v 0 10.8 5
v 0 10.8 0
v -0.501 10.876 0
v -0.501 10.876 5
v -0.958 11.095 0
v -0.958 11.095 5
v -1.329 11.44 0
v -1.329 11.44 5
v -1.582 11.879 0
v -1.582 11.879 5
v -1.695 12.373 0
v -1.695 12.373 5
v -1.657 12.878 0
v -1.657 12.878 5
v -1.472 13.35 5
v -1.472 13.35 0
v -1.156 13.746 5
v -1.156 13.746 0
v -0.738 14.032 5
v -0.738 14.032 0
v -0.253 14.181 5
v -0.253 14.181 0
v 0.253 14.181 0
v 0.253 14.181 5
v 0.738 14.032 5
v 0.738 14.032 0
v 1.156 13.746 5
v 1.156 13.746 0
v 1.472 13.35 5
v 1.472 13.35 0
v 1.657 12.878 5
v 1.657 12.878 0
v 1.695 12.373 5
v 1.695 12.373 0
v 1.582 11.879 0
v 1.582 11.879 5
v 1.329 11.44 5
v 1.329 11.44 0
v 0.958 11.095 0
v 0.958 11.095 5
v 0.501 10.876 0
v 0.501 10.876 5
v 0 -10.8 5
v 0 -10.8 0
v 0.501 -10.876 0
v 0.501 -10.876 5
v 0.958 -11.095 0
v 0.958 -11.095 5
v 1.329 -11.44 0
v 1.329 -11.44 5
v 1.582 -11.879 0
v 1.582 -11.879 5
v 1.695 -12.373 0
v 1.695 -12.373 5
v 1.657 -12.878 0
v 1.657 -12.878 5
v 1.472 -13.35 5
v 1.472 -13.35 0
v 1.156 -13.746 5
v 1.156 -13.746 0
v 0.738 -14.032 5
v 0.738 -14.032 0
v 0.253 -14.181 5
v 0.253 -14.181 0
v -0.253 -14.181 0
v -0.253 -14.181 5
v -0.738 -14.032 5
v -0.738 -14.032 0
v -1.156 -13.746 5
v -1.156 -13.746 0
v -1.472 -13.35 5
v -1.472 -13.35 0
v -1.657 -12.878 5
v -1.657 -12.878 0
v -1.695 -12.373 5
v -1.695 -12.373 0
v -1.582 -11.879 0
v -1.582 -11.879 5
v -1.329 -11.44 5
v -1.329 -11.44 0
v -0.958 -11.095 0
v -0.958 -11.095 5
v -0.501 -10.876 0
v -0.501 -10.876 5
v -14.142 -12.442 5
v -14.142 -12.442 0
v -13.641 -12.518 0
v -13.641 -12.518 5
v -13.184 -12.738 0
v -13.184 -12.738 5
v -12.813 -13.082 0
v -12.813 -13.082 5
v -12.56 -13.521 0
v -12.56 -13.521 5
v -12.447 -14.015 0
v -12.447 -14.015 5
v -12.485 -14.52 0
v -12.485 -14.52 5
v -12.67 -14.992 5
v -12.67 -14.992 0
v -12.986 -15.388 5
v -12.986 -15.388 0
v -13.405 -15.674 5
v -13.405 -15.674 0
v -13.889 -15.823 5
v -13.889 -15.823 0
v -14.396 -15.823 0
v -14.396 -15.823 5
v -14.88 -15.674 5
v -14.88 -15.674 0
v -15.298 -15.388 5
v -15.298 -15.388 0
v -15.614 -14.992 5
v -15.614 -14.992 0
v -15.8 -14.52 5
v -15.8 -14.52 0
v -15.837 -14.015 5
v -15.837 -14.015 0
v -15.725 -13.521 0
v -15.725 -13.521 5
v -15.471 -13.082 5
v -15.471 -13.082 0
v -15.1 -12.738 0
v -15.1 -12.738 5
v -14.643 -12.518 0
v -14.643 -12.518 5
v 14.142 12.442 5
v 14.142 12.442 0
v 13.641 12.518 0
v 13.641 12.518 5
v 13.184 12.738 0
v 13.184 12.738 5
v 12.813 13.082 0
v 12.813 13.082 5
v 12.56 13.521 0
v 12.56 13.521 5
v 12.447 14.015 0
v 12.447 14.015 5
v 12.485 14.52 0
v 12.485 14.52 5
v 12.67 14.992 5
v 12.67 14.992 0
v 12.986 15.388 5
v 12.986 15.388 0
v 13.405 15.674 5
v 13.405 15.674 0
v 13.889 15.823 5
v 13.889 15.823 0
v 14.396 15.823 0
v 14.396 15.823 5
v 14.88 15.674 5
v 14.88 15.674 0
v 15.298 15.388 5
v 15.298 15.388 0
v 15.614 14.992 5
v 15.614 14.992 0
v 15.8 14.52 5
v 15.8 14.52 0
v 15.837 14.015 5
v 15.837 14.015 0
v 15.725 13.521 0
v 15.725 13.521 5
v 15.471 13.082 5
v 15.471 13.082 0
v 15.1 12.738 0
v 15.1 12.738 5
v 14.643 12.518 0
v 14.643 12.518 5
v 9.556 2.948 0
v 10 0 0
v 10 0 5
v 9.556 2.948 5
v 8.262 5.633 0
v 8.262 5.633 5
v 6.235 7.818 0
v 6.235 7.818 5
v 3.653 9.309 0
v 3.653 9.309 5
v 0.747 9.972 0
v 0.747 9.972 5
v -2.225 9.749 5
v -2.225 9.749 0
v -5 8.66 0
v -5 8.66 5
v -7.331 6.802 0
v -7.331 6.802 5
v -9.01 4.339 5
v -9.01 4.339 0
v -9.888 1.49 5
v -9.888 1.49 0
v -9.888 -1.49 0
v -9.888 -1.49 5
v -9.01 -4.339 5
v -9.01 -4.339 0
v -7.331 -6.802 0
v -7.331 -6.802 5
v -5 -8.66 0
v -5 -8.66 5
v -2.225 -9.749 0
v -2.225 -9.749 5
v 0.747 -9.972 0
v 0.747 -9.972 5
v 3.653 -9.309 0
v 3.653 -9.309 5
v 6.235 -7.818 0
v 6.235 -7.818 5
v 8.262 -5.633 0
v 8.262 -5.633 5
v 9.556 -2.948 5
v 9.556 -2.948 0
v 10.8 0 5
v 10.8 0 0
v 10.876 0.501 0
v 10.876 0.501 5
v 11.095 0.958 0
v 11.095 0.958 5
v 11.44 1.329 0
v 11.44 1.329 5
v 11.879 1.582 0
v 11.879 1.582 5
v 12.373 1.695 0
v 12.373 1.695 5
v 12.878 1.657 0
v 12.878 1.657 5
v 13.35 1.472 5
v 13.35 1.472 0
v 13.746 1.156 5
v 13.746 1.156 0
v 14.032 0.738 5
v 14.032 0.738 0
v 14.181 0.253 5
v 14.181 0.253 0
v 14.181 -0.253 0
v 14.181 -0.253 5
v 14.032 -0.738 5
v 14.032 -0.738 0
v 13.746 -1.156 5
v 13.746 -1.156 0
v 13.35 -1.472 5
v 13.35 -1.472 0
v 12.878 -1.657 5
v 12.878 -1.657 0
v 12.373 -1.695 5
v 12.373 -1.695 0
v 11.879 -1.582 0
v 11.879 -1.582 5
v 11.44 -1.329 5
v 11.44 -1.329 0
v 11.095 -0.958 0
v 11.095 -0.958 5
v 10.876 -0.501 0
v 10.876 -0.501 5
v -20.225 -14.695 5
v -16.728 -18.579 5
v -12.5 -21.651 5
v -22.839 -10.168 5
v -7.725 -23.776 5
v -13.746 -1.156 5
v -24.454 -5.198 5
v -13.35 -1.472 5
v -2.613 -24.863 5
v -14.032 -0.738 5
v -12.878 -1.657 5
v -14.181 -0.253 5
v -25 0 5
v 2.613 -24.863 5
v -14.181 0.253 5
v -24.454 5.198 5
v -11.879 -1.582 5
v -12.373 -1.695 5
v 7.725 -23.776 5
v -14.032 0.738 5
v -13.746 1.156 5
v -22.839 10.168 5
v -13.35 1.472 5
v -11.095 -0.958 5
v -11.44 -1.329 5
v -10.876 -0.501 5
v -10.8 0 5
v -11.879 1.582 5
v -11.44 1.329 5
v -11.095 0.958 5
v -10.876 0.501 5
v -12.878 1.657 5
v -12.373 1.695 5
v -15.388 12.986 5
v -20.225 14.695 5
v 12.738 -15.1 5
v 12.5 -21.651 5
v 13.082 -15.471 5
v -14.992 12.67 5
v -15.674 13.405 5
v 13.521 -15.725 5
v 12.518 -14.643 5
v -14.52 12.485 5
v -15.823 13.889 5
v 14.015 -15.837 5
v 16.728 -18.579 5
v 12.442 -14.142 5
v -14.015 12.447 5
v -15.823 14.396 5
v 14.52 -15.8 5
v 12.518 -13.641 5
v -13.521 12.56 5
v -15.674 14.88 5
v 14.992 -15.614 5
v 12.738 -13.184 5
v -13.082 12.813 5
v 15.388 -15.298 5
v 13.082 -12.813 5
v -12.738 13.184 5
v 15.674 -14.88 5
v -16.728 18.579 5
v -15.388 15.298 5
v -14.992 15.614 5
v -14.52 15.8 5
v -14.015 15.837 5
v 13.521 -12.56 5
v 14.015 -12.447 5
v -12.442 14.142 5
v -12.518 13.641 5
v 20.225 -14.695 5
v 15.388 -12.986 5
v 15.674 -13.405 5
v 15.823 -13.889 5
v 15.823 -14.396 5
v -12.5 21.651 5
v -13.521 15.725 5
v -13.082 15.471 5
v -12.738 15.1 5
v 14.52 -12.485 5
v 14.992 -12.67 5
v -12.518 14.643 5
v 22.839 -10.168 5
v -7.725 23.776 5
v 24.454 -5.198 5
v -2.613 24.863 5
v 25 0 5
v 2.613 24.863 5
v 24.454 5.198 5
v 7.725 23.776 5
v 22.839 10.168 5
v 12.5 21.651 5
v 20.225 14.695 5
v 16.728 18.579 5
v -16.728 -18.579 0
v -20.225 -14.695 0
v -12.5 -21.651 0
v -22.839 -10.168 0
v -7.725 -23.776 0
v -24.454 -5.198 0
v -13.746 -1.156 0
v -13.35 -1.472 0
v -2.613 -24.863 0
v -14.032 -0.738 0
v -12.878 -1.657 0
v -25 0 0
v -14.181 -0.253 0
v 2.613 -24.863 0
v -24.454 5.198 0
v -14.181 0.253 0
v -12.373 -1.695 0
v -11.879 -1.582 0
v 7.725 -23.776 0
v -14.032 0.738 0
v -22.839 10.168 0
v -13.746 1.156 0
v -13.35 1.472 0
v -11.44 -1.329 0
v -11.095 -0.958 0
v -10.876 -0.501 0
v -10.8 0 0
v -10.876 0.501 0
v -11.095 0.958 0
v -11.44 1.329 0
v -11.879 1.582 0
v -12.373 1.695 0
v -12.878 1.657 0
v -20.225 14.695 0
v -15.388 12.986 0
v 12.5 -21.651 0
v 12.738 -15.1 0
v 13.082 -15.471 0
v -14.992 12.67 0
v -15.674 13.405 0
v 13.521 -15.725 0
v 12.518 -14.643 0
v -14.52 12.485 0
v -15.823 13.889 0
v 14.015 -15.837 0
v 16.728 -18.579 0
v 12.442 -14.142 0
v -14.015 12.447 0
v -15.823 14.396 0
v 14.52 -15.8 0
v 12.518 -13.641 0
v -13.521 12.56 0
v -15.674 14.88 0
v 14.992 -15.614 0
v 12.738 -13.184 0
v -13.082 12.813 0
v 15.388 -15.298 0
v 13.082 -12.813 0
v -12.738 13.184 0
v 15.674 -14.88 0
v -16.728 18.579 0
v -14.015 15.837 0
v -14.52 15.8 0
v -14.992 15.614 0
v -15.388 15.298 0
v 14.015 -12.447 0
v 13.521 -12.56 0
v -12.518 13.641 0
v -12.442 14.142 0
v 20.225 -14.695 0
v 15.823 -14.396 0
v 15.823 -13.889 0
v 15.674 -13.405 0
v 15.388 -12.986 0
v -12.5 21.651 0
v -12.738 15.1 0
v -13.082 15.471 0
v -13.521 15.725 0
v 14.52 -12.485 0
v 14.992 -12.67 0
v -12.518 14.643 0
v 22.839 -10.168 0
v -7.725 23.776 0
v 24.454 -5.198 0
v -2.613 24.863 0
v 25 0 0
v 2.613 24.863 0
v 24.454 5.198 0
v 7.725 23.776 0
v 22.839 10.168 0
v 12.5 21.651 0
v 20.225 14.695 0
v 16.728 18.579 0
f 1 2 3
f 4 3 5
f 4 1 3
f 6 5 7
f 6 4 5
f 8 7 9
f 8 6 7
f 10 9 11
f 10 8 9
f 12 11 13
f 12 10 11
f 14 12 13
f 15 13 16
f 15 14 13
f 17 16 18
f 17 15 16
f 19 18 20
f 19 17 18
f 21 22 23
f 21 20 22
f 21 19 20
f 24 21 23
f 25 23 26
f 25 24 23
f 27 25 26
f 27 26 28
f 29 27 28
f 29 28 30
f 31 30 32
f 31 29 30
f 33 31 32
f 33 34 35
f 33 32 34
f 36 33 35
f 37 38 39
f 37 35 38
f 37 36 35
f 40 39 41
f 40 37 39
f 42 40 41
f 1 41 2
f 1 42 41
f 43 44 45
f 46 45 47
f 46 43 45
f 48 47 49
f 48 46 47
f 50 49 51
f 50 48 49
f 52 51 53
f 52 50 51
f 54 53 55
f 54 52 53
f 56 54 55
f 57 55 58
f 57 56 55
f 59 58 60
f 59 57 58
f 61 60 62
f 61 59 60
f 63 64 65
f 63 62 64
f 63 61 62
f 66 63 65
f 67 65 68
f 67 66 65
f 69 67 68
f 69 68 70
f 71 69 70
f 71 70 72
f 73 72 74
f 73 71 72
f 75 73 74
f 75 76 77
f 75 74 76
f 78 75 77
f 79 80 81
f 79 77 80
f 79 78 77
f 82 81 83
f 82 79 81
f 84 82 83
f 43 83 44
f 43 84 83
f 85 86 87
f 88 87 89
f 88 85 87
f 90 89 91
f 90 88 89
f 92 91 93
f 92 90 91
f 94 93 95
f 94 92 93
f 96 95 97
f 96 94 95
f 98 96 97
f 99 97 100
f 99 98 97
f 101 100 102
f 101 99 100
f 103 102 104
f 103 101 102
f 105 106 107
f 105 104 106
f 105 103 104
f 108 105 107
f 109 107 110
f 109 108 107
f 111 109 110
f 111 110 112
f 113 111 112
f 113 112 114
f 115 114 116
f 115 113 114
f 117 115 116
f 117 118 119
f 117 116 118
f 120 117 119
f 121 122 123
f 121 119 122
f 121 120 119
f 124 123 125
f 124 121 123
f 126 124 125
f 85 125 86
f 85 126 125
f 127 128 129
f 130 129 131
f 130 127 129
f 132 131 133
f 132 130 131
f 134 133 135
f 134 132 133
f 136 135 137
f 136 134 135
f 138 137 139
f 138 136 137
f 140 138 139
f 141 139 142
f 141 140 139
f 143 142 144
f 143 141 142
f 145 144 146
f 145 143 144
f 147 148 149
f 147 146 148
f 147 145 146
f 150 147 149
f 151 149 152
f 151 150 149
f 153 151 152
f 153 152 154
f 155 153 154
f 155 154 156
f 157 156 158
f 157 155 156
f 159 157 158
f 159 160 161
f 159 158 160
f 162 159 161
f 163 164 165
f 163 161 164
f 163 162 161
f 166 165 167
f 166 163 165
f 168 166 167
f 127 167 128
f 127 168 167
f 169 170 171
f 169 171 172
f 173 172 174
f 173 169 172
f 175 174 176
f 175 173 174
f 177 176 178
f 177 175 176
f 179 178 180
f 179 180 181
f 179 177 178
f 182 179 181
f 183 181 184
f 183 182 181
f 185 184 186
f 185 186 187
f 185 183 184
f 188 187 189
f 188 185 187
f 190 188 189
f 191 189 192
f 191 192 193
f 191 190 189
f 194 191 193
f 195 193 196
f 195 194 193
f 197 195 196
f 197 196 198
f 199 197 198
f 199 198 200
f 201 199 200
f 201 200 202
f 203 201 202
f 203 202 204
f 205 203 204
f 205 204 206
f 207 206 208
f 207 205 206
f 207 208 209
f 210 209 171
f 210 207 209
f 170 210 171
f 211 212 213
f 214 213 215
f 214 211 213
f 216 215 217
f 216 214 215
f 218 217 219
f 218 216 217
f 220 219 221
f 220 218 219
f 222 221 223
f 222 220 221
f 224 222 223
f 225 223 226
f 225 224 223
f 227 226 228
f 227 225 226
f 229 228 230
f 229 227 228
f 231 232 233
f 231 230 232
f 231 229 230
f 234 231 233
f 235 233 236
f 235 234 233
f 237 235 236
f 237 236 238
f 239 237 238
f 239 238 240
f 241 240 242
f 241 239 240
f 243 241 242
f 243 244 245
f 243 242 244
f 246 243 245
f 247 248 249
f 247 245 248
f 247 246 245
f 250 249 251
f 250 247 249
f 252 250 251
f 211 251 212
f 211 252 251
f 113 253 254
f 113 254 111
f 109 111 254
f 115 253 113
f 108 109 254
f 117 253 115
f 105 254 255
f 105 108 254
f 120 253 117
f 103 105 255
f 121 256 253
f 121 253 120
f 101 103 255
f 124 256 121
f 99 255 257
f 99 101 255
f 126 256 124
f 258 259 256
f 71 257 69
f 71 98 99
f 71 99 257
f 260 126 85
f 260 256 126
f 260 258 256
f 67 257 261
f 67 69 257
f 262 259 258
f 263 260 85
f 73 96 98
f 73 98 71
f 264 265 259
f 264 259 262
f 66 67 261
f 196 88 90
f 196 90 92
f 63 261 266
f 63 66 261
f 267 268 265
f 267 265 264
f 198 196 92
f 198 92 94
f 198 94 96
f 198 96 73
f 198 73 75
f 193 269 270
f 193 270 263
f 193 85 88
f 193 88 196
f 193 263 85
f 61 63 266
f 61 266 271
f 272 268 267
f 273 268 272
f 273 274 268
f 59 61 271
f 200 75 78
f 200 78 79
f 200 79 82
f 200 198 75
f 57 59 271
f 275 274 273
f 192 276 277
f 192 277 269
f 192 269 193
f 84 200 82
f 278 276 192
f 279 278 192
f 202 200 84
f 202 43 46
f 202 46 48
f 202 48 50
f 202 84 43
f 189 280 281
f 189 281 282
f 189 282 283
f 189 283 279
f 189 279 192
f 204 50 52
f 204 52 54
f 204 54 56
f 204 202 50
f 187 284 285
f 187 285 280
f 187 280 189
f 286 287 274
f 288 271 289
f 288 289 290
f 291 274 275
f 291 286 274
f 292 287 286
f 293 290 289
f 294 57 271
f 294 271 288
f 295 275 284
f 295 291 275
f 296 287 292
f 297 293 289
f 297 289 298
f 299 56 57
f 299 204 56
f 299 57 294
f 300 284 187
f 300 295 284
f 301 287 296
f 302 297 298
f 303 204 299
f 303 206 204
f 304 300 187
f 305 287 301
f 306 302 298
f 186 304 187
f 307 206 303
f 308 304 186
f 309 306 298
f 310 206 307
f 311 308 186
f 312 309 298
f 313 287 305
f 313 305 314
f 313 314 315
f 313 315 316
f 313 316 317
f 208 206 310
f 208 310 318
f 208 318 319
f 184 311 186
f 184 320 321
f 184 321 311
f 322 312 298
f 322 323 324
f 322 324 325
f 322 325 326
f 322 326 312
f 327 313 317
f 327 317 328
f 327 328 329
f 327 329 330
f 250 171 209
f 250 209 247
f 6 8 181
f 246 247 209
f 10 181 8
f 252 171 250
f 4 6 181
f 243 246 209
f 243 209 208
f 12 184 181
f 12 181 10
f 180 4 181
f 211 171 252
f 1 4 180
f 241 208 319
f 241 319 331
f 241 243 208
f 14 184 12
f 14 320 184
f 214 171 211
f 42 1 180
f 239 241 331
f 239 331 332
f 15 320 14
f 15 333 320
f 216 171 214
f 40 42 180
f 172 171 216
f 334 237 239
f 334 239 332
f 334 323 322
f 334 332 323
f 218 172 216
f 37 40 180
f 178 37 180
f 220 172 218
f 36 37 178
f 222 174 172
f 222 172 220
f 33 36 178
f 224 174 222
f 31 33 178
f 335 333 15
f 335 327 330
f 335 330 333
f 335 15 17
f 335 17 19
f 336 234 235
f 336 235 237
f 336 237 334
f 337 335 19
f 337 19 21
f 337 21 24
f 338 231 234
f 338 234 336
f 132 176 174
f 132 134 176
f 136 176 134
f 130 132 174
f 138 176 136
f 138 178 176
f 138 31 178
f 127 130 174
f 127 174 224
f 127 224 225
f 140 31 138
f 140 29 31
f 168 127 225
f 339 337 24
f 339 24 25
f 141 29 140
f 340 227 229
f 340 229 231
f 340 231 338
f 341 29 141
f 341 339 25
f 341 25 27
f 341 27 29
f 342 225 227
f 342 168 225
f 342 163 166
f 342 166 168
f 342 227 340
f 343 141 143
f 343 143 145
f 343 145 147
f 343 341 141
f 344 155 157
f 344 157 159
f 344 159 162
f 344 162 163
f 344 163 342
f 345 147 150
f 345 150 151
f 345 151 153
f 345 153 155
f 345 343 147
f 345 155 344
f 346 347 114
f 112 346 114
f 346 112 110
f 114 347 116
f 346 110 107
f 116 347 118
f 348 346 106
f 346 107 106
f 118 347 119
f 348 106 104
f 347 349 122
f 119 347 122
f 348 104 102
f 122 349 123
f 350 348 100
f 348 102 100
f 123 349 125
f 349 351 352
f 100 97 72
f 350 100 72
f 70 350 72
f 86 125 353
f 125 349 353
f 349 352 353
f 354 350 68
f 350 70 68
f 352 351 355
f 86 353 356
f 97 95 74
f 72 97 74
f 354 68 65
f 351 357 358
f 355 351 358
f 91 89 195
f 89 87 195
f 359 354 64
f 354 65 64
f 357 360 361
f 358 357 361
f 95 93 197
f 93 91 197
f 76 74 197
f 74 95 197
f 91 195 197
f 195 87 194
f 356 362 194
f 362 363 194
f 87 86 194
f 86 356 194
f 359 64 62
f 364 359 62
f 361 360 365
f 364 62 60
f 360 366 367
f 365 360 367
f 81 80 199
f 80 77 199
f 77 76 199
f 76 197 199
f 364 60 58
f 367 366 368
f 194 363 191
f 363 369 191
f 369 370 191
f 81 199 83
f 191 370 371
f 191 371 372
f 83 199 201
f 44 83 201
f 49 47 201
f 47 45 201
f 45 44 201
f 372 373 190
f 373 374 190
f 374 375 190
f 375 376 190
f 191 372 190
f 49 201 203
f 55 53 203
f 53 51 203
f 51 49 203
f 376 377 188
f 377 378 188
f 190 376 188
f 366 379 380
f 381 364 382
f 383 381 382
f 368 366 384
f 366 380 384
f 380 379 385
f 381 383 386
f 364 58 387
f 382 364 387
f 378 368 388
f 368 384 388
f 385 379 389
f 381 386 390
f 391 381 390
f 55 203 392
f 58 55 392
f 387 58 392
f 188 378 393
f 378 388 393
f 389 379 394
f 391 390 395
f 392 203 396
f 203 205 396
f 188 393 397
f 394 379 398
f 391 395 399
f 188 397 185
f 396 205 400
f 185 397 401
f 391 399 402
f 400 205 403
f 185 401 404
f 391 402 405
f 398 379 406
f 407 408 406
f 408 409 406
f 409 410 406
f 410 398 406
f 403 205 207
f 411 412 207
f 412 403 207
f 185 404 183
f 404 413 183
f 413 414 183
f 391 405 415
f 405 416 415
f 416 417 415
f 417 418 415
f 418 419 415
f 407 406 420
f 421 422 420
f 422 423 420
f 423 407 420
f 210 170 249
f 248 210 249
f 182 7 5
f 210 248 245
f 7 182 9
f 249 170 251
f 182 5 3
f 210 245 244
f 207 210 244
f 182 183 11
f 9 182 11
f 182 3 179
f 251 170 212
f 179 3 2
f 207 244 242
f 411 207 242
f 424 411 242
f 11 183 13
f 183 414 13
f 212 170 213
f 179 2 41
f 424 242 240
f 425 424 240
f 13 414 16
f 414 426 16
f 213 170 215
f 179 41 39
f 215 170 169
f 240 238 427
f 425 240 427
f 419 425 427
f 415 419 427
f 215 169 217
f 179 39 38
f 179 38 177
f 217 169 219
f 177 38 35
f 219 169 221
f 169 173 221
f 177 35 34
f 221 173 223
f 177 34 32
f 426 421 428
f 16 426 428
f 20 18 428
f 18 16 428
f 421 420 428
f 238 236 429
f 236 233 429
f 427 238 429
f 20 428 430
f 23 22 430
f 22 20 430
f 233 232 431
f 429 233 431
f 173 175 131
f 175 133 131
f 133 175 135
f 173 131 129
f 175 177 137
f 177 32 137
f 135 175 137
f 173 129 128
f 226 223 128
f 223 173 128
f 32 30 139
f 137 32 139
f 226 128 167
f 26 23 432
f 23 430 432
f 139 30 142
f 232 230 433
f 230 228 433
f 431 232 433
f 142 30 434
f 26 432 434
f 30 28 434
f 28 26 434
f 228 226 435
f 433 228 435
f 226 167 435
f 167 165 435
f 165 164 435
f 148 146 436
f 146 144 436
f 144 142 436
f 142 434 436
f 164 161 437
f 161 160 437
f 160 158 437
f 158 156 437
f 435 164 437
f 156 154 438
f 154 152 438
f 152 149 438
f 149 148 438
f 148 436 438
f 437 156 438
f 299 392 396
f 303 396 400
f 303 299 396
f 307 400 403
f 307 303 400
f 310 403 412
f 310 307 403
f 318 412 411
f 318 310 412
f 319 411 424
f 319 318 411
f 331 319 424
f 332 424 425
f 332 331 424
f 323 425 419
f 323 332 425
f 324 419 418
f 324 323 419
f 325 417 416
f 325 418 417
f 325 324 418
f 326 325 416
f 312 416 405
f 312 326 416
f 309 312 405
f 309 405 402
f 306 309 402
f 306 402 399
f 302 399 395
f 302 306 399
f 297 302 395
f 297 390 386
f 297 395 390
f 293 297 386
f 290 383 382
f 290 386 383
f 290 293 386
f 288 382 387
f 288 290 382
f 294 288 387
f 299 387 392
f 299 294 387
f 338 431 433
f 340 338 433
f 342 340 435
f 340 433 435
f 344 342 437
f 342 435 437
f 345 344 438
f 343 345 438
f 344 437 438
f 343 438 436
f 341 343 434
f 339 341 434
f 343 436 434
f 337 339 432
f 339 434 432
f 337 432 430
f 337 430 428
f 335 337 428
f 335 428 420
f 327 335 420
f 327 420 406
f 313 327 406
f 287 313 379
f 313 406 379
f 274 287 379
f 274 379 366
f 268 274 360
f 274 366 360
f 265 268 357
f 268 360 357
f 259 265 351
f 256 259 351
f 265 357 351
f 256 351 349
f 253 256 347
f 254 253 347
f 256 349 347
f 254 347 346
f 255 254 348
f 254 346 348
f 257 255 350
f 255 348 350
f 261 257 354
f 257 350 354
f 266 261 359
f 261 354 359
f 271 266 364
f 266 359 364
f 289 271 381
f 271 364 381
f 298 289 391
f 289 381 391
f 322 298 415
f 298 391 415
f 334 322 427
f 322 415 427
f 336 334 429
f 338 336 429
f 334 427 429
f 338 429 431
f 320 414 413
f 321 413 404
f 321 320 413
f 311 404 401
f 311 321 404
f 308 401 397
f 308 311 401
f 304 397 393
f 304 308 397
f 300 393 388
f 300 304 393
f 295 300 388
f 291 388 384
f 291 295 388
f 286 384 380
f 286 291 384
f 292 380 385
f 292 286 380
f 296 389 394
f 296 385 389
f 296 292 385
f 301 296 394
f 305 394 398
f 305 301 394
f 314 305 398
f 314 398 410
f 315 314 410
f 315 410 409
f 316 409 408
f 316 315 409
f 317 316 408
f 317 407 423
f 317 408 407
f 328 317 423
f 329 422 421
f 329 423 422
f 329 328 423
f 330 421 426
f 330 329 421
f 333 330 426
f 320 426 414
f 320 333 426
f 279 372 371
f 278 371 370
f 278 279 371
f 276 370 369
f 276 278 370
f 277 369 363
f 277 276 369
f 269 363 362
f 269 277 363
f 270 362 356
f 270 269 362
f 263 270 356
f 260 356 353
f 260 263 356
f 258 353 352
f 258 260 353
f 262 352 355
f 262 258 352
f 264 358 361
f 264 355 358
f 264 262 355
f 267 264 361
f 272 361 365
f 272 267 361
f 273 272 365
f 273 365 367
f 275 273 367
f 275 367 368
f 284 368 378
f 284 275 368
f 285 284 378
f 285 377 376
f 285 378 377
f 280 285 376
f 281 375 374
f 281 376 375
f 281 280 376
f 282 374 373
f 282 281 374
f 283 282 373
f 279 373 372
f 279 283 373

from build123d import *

# Parameters (mm, degrees)
SKETCH1_R           = 25
SKETCH1_R_2         = 10
BOSS_EXTRUDE1_DEPTH = 5
CIRPATTERN1_COUNT   = 4
CIRPATTERN2_COUNT   = 4


with BuildPart() as part:
    # Sketch1 → Boss-Extrude1 (new body)
    with BuildSketch(Plane.XY):
        Circle(SKETCH1_R)
        Circle(SKETCH1_R_2, mode=Mode.SUBTRACT)
    extrude(amount=BOSS_EXTRUDE1_DEPTH)

    # Sketch4 → M3 Clearance Hole1 (revolve, cut)
    with BuildSketch(Plane(origin=(0, 12.5, 5), x_dir=(0, -1, 0), z_dir=(1, 0, 0))):
        Polygon((0, 0), (0, 8.521463052), (1.7, 7.5), (1.7, 0), align=None)
    m3_clearance_hole1 = revolve(axis=Axis((0, 12.5, 11.35), (0, 0, -1)), mode=Mode.SUBTRACT)

    # CirPattern1: M3 Clearance Hole1 ×4 about axis
    cirpattern1_axis = Axis((0, 0, 0), (0, 0, 1))
    for i in range(1, CIRPATTERN1_COUNT):
        add(m3_clearance_hole1.rotate(cirpattern1_axis, i * 360 / CIRPATTERN1_COUNT), mode=Mode.SUBTRACT)

    # Sketch6 → M3 Clearance Hole2 (revolve, cut)
    with BuildSketch(Plane(origin=(14.142135624, 14.142135624, 5), x_dir=(0, -1, 0), z_dir=(1, 0, 0))):
        Polygon((0, 0), (0, 8.521463052), (1.7, 7.5), (1.7, 0), align=None)
    m3_clearance_hole2 = revolve(axis=Axis((14.142135624, 14.142135624, 11.35), (0, 0, -1)), mode=Mode.SUBTRACT)

    # CirPattern2: M3 Clearance Hole2 ×4 about axis
    cirpattern2_axis = Axis((0, 0, 0), (0, 0, 1))
    for i in range(1, CIRPATTERN2_COUNT):
        add(m3_clearance_hole2.rotate(cirpattern2_axis, i * 360 / CIRPATTERN2_COUNT), mode=Mode.SUBTRACT)


solid = part.part
